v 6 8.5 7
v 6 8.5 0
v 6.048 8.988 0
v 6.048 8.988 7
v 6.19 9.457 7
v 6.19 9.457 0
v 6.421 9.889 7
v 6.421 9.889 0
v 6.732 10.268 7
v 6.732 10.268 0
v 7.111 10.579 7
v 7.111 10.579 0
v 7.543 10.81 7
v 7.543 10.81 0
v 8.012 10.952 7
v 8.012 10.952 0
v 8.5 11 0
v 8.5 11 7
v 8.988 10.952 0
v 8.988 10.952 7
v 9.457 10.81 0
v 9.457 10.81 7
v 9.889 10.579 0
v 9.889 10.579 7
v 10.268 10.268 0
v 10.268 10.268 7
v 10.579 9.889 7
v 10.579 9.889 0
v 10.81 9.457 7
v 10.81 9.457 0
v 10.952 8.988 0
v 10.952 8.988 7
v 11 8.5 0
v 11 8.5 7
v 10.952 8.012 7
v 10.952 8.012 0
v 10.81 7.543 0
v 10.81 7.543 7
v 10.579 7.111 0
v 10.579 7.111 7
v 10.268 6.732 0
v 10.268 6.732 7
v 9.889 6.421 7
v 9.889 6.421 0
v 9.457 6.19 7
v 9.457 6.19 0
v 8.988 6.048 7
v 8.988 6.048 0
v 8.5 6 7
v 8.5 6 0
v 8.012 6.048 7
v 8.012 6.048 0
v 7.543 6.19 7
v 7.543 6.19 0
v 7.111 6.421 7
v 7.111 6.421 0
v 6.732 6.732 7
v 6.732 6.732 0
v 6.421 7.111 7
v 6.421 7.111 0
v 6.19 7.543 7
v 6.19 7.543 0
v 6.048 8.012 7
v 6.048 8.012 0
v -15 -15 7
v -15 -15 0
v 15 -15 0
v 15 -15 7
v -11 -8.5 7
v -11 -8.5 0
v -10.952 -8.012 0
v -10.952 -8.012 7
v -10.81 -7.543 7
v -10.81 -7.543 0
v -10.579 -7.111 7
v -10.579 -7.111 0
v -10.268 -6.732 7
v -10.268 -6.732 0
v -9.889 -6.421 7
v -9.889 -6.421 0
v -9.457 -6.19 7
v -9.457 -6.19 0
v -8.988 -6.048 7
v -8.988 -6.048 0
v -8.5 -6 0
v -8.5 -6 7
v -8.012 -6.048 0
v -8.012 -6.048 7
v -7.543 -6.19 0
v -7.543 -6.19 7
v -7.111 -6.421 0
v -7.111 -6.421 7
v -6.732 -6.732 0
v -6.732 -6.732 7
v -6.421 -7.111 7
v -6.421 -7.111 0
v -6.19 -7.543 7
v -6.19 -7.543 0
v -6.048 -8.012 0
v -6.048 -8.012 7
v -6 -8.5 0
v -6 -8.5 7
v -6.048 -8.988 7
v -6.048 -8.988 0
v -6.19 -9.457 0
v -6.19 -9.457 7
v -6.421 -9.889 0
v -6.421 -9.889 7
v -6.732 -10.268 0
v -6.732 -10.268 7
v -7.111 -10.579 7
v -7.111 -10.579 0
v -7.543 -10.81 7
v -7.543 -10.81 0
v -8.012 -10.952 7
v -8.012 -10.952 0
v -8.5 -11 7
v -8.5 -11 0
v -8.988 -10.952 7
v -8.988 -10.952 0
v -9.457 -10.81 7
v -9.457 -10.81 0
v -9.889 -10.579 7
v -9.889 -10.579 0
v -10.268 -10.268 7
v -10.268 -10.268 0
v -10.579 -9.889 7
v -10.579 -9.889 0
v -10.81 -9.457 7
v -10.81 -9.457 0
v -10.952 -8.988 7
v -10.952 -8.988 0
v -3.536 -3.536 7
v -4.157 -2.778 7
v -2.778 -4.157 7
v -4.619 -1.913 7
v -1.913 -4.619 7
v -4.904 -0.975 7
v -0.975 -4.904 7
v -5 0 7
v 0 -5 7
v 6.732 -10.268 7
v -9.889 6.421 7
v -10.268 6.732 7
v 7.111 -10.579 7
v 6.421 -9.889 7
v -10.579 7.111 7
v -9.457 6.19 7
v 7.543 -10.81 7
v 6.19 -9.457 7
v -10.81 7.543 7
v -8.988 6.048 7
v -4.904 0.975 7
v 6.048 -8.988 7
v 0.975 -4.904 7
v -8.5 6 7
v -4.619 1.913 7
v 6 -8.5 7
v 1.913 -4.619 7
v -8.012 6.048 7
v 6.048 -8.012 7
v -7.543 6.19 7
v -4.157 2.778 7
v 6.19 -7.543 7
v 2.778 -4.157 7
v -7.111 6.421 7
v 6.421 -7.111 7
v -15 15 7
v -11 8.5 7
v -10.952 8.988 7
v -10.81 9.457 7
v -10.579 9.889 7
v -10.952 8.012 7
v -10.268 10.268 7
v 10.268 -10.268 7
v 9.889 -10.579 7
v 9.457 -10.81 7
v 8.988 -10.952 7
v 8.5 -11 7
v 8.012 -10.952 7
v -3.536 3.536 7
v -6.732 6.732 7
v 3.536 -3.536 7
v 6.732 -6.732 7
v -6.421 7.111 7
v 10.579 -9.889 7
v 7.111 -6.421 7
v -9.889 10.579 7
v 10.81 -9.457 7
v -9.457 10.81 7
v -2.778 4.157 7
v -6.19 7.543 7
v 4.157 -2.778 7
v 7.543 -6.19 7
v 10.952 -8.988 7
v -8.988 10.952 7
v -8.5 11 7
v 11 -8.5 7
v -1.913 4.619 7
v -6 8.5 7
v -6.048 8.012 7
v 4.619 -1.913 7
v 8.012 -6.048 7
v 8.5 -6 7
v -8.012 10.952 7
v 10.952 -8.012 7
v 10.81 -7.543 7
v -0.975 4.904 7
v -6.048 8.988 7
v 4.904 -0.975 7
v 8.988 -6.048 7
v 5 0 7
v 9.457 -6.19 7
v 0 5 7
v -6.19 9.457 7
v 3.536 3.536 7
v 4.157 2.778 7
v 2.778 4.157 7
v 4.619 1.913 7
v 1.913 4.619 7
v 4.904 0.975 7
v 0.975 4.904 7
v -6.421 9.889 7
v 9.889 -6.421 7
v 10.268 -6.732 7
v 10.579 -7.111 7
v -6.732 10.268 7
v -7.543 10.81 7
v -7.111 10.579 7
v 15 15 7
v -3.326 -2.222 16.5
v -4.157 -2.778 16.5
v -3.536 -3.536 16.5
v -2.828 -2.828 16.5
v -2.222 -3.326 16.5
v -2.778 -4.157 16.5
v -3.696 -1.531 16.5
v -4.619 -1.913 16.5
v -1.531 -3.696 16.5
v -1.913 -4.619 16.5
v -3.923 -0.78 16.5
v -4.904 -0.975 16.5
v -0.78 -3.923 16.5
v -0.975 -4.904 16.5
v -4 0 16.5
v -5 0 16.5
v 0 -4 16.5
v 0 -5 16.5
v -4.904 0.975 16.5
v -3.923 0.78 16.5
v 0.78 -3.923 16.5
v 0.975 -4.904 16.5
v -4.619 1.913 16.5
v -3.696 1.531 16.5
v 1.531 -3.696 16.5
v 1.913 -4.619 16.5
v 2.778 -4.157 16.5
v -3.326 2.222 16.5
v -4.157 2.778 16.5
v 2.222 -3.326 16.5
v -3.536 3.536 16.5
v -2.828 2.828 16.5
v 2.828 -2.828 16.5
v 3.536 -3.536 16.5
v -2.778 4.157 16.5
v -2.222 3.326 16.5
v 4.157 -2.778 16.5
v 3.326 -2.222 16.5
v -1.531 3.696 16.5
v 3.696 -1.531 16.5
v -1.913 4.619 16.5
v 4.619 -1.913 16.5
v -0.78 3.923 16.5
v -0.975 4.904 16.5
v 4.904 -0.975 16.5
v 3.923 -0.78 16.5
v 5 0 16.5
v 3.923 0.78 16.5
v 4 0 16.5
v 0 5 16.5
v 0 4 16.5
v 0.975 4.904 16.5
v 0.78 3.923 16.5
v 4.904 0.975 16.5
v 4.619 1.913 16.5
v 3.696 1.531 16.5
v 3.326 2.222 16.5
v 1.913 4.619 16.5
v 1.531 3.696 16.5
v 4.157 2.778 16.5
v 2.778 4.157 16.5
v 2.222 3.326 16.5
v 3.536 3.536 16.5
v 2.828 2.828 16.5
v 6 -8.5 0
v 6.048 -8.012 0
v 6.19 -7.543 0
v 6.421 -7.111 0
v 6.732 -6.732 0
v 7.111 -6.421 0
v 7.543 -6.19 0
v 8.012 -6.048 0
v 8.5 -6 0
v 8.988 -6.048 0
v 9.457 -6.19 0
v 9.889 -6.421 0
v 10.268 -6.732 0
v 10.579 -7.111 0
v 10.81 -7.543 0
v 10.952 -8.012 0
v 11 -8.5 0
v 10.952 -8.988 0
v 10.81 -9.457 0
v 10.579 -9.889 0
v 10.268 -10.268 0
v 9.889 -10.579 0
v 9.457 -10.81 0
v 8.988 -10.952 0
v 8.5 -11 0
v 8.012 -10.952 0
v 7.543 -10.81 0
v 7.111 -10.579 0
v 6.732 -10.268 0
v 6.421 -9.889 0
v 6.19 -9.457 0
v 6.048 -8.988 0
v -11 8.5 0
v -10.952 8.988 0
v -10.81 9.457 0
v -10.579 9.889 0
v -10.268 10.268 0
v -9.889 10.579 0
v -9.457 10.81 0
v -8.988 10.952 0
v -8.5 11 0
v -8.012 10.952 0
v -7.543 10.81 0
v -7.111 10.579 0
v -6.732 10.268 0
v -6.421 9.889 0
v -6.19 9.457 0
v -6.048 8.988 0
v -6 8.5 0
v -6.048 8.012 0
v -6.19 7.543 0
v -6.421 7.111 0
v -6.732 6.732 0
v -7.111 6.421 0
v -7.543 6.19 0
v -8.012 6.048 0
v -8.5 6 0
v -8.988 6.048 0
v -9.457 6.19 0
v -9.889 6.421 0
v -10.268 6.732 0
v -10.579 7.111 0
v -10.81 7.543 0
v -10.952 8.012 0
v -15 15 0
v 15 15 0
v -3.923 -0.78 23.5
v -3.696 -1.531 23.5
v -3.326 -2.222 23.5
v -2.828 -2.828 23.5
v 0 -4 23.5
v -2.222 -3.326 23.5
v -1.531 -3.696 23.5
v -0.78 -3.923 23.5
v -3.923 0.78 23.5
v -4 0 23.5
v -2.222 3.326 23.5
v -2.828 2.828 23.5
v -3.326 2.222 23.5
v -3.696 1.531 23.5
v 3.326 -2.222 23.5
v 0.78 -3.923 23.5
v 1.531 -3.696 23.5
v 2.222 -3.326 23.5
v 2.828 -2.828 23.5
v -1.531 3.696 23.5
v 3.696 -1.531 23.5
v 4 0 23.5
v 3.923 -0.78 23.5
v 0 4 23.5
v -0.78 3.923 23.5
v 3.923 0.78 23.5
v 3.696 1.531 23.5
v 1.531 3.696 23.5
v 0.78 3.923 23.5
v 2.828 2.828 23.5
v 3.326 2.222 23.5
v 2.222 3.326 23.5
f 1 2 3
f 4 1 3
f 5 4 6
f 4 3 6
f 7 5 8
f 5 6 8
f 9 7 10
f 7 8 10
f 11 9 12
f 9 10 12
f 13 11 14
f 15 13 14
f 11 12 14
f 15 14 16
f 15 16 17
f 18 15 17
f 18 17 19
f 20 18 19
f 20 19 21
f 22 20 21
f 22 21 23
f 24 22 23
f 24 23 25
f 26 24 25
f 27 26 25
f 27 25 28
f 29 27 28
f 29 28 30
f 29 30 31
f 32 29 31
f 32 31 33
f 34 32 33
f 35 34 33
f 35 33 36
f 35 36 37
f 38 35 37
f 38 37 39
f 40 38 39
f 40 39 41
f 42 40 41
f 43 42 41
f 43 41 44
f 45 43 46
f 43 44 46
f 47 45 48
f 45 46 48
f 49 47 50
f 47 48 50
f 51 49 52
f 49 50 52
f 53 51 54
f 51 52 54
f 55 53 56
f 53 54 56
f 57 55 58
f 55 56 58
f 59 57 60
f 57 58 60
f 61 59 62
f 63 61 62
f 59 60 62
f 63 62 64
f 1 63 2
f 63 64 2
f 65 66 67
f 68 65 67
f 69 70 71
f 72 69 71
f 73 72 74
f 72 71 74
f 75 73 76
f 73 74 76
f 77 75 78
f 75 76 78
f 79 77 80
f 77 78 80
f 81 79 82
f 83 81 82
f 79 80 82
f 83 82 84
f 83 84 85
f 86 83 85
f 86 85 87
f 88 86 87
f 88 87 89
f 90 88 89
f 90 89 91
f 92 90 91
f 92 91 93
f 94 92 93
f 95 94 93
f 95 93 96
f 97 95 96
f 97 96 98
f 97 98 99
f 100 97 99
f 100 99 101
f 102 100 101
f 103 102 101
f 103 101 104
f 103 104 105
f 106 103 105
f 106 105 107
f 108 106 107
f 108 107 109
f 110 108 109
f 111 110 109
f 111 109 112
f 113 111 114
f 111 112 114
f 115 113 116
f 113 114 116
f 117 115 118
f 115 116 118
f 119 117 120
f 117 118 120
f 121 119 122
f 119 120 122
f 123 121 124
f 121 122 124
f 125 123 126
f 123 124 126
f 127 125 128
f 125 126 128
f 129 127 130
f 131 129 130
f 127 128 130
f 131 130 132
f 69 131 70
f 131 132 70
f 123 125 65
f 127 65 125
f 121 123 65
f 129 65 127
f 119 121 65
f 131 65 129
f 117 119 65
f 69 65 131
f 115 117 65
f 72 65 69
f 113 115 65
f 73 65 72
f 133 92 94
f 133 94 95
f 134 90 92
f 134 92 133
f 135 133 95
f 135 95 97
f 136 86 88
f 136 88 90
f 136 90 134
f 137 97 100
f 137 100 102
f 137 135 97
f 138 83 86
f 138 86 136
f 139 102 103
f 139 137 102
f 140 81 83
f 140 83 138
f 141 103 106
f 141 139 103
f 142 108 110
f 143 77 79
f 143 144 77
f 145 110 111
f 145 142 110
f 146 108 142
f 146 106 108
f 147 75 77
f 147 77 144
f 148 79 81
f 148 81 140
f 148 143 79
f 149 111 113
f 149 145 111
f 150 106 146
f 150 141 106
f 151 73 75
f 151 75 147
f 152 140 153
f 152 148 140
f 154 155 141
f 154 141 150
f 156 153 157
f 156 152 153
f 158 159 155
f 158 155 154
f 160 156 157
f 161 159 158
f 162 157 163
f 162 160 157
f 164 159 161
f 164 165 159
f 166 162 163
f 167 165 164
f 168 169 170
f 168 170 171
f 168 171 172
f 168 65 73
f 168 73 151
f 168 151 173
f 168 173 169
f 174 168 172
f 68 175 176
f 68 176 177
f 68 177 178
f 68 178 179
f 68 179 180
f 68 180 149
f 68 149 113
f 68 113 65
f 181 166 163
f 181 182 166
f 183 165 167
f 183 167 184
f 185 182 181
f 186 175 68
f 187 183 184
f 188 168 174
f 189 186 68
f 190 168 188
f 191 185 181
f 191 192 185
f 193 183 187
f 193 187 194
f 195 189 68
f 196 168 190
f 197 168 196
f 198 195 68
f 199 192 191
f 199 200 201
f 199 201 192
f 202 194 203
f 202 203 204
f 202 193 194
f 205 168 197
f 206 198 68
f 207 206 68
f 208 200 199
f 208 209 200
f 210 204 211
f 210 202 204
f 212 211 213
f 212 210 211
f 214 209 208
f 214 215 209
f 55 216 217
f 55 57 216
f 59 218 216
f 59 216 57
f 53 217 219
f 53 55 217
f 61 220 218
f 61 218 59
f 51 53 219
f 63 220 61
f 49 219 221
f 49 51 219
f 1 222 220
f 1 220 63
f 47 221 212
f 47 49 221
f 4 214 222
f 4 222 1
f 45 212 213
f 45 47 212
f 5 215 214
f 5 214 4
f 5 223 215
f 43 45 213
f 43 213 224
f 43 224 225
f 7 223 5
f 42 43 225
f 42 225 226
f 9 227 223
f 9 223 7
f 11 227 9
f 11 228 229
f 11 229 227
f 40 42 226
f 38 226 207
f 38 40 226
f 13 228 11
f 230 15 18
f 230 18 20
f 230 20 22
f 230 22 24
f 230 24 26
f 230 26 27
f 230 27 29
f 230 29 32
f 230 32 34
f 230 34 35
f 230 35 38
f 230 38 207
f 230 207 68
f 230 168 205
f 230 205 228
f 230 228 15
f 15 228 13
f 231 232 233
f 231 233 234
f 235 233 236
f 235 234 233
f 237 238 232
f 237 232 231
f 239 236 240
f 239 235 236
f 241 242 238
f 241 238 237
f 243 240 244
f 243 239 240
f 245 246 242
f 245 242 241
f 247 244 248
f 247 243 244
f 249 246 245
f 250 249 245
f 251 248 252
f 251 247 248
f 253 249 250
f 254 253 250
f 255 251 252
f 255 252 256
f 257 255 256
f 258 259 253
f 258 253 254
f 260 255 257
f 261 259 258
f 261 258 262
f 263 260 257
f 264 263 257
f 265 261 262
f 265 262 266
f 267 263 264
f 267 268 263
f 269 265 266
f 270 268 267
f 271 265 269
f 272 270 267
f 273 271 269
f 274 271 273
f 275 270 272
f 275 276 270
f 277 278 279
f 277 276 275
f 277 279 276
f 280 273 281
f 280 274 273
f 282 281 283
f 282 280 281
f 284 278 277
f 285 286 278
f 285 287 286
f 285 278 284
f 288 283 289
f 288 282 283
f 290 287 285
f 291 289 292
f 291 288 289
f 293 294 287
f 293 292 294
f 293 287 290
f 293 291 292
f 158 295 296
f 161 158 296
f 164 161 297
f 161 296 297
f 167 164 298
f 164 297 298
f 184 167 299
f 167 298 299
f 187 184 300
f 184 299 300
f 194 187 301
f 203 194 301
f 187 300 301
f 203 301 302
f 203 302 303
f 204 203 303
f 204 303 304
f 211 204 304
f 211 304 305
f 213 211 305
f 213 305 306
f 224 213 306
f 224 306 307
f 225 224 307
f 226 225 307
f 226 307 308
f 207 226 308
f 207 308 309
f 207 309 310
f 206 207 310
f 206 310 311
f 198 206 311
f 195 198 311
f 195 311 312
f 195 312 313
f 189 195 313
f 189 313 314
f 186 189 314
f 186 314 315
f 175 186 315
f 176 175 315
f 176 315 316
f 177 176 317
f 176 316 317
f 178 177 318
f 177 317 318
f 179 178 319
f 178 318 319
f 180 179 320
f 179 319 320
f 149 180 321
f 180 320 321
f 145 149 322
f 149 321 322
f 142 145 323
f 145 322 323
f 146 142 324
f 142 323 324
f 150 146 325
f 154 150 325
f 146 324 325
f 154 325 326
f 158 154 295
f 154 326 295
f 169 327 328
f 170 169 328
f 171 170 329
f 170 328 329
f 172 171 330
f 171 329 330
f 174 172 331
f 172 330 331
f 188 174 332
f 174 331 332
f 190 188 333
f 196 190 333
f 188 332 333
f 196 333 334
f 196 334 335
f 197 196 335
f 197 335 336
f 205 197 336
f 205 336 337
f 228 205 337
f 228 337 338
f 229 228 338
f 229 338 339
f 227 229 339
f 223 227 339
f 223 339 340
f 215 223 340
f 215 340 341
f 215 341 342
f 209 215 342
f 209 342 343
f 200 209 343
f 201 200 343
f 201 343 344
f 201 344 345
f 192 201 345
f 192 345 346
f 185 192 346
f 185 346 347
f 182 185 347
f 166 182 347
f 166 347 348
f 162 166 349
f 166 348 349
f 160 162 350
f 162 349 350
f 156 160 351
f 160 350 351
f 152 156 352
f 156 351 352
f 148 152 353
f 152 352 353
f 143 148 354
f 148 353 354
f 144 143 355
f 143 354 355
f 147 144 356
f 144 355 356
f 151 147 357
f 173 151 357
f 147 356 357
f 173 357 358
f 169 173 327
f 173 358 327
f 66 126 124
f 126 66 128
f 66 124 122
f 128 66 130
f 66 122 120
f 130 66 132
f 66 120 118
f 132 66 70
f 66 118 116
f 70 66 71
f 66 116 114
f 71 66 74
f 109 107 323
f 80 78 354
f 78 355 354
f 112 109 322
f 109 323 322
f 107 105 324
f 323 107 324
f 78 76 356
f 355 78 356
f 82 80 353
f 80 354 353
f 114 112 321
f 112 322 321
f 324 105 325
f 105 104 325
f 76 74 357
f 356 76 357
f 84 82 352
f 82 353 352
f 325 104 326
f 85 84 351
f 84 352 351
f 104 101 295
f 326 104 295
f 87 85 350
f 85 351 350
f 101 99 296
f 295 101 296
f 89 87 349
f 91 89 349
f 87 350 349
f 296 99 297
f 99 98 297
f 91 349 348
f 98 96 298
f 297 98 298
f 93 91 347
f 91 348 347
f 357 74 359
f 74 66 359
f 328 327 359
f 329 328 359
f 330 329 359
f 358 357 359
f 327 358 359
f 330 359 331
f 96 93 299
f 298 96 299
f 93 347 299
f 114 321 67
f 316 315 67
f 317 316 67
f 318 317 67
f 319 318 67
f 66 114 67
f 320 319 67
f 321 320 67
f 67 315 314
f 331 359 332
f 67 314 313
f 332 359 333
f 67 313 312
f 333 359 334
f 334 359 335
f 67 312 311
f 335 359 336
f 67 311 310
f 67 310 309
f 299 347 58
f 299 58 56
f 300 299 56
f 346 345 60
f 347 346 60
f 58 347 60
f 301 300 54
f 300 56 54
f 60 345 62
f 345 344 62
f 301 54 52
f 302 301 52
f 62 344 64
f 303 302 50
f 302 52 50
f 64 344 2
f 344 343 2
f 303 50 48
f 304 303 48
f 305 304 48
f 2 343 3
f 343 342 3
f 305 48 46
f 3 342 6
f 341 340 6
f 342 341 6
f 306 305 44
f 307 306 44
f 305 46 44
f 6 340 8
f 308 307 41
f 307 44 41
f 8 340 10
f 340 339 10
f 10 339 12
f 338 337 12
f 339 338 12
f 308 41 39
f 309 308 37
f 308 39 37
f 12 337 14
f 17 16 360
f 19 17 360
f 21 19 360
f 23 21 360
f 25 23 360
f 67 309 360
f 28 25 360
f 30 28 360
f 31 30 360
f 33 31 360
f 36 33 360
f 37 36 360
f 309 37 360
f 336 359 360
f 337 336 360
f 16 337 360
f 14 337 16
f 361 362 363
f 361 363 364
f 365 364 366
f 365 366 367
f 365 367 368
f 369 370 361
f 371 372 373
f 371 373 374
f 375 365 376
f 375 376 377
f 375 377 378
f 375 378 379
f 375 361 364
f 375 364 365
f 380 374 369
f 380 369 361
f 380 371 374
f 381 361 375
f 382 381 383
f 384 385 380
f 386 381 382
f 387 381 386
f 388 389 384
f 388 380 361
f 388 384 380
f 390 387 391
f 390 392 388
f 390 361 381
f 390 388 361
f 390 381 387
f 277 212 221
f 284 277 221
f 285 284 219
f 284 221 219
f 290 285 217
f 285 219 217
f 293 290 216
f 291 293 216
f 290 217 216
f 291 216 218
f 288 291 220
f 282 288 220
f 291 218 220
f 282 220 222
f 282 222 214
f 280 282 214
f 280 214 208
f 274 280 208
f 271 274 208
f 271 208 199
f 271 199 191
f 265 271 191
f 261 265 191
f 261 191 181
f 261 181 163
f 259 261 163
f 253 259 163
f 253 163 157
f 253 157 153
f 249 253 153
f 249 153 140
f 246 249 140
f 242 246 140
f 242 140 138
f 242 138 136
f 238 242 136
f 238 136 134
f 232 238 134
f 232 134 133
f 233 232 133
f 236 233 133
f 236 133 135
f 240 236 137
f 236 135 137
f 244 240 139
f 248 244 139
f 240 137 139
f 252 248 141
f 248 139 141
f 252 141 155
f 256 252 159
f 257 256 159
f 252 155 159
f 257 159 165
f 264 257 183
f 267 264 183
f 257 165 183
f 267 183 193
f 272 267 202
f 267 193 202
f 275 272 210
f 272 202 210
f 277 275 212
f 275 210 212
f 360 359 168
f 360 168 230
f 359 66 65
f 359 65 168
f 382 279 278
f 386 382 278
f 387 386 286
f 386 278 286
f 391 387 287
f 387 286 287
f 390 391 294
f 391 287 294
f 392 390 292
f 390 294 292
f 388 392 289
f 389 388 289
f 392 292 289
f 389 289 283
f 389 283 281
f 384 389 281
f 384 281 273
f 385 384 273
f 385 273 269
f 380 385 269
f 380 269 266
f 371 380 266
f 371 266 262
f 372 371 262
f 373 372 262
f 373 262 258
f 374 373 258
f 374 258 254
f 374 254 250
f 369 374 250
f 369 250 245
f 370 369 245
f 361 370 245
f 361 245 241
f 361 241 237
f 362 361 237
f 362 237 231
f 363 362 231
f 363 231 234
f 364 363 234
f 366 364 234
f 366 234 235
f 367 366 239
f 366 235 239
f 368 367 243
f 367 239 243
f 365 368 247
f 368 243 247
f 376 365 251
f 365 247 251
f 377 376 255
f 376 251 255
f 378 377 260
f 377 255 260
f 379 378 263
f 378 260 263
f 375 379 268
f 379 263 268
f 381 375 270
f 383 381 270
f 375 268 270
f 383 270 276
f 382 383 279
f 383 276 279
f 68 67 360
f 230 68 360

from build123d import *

# Parameters (mm, degrees)
F0_W     = 30
F0_H     = 30
F0_R     = 5
F1_DEPTH = 7
F0_R_2   = 4
F2_DEPTH = 16.5
F3_DEPTH = 23.5
F5_D     = 5


with BuildPart() as f1:
    # F0 (on Top) → F1 (new body)
    with BuildSketch(Plane.XY):
        Rectangle(F0_W, F0_H)
        Circle(F0_R, mode=Mode.SUBTRACT)
    extrude(amount=F1_DEPTH)

    # F0 (on Top) → F2 (join)
    with BuildSketch(Plane.XY):
        Circle(F0_R)
        Circle(F0_R_2, mode=Mode.SUBTRACT)
    extrude(amount=F2_DEPTH)

    # F0 (on Top) → F3 (join)
    with BuildSketch(Plane.XY):
        Circle(F0_R_2)
    extrude(amount=F3_DEPTH)

    # F5 (through all)
    with Locations(Plane.XY.offset(7)):
        with Locations((8.5, 8.5), (-8.5, 8.5), (-8.5, -8.5), (8.5, -8.5)):
            Hole(F5_D / 2)


solid = f1.part
